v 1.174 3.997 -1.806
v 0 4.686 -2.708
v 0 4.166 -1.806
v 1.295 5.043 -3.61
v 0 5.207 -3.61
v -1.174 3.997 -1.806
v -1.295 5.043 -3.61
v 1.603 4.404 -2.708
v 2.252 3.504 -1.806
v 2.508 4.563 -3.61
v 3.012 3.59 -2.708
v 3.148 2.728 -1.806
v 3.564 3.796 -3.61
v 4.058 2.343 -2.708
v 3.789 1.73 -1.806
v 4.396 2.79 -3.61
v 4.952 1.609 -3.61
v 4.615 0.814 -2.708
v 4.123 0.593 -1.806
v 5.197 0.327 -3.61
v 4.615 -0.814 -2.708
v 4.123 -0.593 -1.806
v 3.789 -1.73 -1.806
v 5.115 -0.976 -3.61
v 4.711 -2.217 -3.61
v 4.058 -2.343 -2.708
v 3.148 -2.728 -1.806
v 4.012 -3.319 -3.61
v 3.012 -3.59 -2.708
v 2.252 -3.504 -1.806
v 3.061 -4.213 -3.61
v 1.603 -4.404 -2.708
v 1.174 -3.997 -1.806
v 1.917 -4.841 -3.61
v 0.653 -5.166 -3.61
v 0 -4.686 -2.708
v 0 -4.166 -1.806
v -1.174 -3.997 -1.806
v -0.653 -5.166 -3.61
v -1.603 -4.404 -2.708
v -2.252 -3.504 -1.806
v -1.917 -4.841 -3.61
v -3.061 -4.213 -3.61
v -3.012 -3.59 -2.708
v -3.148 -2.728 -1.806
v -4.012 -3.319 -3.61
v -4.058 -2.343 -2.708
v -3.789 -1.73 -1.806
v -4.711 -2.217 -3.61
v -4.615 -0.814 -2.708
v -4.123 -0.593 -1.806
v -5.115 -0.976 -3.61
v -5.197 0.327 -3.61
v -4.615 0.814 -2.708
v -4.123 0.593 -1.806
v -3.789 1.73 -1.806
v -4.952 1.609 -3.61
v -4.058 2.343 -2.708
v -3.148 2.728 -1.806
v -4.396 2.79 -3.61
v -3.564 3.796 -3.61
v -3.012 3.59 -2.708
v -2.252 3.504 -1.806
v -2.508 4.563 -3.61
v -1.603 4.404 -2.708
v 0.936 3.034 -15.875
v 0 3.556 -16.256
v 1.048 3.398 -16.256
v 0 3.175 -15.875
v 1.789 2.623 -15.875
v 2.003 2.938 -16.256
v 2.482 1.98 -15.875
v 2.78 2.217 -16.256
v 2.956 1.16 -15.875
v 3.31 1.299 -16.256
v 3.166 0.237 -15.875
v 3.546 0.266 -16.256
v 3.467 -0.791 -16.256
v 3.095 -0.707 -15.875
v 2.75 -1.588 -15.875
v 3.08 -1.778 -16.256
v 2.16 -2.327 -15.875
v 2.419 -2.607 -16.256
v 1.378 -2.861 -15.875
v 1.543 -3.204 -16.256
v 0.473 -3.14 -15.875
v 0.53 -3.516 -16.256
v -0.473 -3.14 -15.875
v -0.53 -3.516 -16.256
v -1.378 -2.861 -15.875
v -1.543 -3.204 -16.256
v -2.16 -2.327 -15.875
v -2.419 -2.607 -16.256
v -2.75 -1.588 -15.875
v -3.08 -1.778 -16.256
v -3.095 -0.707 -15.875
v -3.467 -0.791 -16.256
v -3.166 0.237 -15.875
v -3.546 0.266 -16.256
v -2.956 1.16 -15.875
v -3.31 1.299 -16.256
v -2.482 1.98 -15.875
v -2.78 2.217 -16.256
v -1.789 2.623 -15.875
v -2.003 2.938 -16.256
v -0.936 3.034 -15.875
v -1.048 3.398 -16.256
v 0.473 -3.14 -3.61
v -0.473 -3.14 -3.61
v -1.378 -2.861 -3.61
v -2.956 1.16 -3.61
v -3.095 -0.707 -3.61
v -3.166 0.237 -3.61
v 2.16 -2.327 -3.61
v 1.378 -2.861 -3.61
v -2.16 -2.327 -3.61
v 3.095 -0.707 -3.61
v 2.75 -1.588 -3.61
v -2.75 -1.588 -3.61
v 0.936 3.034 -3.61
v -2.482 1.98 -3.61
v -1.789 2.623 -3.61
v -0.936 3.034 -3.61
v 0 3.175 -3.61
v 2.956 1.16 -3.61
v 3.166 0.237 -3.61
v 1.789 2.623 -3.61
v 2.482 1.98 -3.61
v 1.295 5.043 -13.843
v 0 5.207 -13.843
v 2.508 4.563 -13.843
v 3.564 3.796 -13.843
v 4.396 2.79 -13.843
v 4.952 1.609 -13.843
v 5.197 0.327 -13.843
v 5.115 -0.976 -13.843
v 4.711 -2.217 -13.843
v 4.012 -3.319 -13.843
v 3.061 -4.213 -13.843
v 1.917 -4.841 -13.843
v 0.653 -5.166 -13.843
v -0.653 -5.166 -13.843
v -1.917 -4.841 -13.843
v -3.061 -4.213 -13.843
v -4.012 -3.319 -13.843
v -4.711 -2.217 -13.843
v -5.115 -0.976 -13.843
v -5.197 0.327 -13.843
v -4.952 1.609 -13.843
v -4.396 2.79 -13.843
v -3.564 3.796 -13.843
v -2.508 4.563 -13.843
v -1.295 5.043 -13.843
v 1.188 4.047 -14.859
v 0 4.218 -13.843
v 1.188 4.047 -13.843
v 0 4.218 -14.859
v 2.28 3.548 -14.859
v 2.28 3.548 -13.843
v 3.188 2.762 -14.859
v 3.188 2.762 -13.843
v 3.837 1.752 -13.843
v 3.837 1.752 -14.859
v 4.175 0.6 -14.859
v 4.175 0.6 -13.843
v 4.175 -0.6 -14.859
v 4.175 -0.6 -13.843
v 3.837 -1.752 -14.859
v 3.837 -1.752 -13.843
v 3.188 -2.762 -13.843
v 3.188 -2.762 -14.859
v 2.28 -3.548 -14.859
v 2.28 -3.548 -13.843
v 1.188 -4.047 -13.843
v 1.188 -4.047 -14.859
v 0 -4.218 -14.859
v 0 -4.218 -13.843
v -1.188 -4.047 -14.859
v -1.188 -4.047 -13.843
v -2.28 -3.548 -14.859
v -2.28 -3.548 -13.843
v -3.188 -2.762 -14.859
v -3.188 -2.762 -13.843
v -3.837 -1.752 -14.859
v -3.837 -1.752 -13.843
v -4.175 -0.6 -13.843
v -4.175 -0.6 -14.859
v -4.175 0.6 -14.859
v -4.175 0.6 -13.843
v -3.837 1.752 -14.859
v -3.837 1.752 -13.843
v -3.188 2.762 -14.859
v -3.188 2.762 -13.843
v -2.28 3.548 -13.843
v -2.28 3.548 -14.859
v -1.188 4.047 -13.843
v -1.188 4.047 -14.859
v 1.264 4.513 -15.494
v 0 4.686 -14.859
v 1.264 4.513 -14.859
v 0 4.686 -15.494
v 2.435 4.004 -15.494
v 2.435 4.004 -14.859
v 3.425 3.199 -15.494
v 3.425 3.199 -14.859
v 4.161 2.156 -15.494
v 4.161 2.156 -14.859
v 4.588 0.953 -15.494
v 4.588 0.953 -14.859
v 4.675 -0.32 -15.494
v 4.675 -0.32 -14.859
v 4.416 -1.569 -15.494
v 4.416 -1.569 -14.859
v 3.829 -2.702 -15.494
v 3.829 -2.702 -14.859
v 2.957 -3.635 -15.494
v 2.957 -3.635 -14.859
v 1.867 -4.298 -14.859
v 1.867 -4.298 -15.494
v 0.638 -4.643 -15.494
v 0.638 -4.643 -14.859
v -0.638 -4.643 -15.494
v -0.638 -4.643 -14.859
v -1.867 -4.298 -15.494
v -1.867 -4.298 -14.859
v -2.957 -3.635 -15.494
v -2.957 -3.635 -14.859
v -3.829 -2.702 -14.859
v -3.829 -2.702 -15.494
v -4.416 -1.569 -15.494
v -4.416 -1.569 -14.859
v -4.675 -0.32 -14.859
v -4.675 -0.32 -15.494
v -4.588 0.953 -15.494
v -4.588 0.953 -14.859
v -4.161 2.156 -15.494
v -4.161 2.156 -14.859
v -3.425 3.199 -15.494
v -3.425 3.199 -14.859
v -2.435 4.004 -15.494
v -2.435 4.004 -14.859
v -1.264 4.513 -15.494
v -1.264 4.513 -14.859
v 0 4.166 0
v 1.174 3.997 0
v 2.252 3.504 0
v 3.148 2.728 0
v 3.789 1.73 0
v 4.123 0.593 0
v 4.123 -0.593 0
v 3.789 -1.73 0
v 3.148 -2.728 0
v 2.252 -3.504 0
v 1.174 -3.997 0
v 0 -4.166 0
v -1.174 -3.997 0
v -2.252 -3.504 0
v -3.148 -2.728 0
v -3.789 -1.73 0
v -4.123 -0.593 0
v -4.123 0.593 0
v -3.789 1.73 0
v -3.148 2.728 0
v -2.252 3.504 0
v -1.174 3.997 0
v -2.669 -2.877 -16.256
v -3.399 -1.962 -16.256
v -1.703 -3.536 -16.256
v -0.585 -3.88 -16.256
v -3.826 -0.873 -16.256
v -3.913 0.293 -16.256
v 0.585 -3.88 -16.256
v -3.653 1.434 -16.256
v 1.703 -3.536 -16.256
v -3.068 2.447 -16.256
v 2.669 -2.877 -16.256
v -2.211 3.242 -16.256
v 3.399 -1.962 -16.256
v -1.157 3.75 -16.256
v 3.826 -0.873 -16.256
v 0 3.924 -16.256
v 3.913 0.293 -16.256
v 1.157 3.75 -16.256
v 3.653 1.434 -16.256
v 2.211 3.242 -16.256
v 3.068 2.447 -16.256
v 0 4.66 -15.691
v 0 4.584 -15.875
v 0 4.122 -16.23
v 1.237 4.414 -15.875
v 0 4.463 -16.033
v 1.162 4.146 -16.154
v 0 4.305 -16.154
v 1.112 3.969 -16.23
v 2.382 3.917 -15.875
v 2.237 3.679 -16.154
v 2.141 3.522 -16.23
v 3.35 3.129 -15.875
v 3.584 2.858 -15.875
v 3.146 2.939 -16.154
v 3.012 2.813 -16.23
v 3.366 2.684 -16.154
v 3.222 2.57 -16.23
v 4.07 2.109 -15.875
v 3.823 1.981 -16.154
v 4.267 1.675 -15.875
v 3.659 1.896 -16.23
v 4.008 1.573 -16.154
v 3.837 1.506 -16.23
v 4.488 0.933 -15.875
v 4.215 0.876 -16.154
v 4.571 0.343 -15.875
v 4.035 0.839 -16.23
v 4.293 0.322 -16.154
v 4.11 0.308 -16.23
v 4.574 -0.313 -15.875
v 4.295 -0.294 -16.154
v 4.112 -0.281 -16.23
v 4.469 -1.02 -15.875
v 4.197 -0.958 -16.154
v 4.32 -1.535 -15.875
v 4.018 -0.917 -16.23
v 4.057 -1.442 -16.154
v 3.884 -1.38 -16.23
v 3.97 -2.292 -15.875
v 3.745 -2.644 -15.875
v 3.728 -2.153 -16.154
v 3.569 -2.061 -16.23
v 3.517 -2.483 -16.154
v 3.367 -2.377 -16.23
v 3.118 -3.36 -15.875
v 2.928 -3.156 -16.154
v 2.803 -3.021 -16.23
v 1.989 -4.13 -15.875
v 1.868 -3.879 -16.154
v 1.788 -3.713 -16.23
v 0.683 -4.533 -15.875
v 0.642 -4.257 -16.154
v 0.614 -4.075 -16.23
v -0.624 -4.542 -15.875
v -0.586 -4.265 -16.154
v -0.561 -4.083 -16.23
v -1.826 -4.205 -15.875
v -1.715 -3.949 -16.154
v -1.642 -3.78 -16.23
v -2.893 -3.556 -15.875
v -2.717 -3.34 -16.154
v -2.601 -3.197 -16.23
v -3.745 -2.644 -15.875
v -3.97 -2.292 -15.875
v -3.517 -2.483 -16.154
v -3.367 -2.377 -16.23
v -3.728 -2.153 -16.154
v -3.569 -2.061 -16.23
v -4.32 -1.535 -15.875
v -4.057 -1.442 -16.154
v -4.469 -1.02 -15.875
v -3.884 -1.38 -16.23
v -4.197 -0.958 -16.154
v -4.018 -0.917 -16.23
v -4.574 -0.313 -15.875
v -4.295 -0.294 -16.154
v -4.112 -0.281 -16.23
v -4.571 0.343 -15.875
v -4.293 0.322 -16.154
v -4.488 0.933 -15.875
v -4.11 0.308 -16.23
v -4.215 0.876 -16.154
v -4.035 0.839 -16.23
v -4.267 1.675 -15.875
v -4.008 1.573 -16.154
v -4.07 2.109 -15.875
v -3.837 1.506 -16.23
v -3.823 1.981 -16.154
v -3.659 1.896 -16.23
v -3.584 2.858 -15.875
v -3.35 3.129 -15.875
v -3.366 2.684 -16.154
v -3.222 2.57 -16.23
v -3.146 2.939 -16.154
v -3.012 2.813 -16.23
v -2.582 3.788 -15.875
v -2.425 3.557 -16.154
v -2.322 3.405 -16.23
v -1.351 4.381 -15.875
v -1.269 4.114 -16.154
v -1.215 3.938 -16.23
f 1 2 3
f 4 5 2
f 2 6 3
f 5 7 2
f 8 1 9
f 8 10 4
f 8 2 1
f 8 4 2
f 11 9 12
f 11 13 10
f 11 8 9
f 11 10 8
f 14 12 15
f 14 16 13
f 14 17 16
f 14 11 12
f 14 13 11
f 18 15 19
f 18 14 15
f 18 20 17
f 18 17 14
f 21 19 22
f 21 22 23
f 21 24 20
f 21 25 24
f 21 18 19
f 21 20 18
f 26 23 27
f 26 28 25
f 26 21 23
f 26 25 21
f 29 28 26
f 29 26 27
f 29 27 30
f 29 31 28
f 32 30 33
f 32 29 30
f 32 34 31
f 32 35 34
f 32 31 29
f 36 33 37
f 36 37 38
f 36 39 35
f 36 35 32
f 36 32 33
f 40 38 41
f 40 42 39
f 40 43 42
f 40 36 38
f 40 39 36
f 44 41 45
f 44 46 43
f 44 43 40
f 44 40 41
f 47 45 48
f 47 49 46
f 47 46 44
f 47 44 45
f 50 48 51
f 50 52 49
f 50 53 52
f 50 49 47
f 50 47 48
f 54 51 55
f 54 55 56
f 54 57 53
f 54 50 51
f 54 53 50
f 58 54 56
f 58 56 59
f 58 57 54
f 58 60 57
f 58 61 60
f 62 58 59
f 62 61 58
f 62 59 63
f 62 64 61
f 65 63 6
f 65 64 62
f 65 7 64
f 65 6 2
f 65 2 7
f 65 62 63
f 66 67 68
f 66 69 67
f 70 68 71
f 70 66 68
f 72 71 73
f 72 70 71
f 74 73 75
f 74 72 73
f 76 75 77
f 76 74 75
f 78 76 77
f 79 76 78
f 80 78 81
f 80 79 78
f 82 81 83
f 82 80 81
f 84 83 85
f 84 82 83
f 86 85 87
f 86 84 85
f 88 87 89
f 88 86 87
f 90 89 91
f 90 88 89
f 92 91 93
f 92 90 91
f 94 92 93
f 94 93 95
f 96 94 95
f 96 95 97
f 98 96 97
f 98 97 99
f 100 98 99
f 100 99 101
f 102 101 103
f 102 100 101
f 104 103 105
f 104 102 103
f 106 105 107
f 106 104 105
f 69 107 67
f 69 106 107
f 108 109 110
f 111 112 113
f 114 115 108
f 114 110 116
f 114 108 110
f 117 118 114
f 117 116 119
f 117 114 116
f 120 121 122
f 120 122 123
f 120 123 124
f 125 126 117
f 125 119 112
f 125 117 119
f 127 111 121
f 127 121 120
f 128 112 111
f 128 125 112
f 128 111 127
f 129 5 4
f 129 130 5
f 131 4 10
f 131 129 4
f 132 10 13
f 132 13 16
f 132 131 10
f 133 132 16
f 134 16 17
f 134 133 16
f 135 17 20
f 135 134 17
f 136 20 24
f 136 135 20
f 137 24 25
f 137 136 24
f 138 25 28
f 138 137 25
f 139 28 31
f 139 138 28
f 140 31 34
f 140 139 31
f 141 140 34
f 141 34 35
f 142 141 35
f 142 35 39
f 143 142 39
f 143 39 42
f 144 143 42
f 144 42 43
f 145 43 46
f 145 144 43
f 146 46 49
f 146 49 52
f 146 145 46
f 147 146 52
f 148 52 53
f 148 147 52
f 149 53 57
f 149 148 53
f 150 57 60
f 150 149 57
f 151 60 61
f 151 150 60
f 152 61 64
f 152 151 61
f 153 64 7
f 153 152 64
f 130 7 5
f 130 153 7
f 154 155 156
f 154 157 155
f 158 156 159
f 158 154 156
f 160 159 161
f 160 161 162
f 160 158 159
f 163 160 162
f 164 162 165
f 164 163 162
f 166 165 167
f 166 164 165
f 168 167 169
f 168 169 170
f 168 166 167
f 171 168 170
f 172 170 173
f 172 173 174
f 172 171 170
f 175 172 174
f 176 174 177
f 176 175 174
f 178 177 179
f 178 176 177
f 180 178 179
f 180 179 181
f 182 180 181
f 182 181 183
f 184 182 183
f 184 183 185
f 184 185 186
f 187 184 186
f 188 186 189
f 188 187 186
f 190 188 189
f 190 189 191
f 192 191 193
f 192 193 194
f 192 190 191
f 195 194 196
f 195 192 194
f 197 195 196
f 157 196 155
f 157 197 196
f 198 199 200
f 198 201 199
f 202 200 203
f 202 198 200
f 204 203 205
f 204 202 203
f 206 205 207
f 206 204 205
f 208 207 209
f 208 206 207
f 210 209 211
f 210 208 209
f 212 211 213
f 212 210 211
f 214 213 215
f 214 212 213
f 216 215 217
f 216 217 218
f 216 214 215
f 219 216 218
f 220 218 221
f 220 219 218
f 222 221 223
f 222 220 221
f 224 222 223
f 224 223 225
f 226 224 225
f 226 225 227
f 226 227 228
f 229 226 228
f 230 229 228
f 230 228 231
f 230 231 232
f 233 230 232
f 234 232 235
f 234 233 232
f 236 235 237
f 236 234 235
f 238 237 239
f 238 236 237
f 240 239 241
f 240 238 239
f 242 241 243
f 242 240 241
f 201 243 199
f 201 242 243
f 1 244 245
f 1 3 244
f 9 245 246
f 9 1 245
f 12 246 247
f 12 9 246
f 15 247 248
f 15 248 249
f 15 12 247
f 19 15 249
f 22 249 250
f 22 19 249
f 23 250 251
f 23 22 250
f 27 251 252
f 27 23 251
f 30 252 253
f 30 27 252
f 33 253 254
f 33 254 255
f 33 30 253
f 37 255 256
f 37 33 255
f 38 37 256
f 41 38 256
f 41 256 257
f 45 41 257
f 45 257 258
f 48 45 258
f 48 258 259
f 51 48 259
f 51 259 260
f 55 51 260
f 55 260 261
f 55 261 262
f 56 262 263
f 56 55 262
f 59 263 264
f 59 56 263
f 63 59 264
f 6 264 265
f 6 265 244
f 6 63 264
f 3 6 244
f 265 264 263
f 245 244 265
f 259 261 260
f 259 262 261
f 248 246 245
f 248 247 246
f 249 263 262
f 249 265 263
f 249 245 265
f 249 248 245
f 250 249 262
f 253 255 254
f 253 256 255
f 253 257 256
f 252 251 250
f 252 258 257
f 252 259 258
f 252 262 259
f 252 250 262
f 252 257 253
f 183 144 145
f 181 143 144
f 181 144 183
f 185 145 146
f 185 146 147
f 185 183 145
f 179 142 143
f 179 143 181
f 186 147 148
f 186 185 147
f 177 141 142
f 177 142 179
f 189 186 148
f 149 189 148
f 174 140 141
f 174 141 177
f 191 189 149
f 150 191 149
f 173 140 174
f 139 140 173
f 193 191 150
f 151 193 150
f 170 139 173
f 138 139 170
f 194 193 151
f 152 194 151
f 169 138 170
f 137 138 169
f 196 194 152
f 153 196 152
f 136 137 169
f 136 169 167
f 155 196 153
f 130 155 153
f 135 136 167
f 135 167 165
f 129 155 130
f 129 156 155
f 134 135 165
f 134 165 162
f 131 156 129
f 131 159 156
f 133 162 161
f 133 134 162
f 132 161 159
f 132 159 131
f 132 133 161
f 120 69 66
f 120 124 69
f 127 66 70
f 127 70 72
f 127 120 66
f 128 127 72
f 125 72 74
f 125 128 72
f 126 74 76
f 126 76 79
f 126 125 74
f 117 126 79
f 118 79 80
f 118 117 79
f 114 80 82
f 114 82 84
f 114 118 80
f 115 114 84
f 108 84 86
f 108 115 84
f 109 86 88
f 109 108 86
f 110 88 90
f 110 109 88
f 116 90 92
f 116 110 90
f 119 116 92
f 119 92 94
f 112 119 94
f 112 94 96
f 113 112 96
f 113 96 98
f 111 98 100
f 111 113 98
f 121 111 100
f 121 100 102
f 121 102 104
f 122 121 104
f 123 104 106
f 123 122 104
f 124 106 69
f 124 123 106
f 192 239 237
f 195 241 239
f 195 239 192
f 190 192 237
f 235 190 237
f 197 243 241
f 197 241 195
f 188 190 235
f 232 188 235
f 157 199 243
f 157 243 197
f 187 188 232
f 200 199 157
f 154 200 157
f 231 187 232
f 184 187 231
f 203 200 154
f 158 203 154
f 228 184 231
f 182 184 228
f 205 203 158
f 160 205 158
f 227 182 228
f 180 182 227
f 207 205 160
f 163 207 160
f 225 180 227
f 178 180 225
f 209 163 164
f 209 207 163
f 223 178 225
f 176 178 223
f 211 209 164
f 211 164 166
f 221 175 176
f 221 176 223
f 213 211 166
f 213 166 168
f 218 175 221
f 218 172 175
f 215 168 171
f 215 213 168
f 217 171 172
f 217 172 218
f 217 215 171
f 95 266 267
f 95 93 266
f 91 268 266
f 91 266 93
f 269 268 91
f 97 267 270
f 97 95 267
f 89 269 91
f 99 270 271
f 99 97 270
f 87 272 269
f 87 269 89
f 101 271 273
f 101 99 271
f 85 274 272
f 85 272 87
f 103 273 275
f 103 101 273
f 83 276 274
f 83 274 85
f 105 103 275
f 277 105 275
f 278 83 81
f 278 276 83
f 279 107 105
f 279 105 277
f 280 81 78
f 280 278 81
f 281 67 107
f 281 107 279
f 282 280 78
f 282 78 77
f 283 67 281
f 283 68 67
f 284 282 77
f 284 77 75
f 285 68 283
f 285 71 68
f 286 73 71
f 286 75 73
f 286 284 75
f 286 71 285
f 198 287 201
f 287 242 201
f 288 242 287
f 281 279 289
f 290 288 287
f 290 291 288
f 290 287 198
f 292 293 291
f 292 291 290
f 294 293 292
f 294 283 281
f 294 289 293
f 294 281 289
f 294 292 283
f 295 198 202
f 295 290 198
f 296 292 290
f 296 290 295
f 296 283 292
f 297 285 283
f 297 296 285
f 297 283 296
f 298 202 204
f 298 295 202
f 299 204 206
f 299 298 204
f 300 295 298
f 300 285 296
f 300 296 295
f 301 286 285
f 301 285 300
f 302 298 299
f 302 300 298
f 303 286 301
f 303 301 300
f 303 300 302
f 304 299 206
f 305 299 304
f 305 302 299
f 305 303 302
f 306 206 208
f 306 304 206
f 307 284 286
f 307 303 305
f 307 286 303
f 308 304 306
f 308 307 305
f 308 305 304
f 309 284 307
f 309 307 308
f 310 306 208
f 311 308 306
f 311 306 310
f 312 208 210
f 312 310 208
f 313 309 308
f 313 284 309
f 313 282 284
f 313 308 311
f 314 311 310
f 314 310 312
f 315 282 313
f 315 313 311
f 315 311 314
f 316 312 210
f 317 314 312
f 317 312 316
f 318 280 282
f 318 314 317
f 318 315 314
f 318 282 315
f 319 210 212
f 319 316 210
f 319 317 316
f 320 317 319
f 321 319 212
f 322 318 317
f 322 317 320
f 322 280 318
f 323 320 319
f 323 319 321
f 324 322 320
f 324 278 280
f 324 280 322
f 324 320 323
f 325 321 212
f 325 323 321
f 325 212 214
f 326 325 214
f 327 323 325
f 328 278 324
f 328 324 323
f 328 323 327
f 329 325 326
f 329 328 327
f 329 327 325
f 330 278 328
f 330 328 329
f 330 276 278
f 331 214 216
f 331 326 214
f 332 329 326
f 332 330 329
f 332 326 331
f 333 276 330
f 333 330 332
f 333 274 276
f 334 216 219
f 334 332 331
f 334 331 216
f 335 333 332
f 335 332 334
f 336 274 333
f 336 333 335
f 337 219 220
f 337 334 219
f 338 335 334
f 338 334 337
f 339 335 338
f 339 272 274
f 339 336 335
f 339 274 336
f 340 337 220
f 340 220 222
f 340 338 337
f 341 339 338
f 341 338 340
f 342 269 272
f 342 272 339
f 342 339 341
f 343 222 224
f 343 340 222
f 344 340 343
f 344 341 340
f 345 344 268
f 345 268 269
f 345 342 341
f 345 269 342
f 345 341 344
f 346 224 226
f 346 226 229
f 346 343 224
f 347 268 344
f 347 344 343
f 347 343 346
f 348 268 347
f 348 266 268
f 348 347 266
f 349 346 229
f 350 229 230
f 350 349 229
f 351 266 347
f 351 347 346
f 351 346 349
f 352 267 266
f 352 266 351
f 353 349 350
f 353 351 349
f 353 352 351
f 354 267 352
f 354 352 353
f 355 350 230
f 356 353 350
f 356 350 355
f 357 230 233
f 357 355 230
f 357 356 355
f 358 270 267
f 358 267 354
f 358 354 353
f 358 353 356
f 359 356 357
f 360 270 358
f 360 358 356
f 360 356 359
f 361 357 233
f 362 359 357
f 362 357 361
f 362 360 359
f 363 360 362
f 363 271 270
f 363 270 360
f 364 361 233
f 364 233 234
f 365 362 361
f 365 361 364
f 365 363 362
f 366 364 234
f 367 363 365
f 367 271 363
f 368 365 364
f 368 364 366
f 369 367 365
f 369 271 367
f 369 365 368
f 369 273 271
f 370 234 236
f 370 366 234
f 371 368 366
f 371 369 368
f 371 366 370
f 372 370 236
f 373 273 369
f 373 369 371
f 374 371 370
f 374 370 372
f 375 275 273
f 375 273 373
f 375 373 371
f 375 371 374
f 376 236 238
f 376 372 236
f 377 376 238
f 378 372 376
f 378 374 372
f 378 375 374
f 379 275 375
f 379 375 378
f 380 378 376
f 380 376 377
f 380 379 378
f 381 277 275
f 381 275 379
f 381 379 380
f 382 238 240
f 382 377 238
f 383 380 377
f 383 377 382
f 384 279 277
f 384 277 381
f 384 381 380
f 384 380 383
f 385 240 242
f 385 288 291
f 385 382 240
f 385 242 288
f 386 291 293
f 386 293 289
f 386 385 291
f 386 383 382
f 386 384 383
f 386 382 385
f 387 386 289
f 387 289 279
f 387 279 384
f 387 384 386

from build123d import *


with BuildPart() as part:
    # Sketch1 → Revolve1 (revolve)
    with BuildSketch(Plane(origin=(0, 0, 0), x_dir=(0, 0, -1), z_dir=(1, 0, 0))):
        with BuildLine():
            Line((14.859, 4.6863), (15.494, 4.6863))
            ThreePointArc((15.494, 4.6863), (16.032815367, 4.463115367), (16.256, 3.9243))
            Line((16.256, 3.9243), (16.256, 3.556))
            Line((16.256, 3.556), (15.875, 3.175))
            Line((15.875, 3.175), (3.609979933, 3.175))
            Line((3.609979933, 3.175), (3.609979933, 0))
            Line((3.609979933, 0), (0, 0))
            Line((0, 0), (0, 4.1656))
            Line((0, 4.1656), (1.806222222, 4.1656))
            Line((1.806222222, 4.1656), (3.609979933, 5.207))
            Line((3.609979933, 5.207), (13.843, 5.207))
            Line((13.843, 5.207), (13.843, 4.21767))
            Line((13.843, 4.21767), (14.859, 4.21767))
            Line((14.859, 4.21767), (14.859, 4.6863))
        make_face()
    revolve(axis=Axis((0, 0, 0), (0, 0, -1)))


solid = part.part
